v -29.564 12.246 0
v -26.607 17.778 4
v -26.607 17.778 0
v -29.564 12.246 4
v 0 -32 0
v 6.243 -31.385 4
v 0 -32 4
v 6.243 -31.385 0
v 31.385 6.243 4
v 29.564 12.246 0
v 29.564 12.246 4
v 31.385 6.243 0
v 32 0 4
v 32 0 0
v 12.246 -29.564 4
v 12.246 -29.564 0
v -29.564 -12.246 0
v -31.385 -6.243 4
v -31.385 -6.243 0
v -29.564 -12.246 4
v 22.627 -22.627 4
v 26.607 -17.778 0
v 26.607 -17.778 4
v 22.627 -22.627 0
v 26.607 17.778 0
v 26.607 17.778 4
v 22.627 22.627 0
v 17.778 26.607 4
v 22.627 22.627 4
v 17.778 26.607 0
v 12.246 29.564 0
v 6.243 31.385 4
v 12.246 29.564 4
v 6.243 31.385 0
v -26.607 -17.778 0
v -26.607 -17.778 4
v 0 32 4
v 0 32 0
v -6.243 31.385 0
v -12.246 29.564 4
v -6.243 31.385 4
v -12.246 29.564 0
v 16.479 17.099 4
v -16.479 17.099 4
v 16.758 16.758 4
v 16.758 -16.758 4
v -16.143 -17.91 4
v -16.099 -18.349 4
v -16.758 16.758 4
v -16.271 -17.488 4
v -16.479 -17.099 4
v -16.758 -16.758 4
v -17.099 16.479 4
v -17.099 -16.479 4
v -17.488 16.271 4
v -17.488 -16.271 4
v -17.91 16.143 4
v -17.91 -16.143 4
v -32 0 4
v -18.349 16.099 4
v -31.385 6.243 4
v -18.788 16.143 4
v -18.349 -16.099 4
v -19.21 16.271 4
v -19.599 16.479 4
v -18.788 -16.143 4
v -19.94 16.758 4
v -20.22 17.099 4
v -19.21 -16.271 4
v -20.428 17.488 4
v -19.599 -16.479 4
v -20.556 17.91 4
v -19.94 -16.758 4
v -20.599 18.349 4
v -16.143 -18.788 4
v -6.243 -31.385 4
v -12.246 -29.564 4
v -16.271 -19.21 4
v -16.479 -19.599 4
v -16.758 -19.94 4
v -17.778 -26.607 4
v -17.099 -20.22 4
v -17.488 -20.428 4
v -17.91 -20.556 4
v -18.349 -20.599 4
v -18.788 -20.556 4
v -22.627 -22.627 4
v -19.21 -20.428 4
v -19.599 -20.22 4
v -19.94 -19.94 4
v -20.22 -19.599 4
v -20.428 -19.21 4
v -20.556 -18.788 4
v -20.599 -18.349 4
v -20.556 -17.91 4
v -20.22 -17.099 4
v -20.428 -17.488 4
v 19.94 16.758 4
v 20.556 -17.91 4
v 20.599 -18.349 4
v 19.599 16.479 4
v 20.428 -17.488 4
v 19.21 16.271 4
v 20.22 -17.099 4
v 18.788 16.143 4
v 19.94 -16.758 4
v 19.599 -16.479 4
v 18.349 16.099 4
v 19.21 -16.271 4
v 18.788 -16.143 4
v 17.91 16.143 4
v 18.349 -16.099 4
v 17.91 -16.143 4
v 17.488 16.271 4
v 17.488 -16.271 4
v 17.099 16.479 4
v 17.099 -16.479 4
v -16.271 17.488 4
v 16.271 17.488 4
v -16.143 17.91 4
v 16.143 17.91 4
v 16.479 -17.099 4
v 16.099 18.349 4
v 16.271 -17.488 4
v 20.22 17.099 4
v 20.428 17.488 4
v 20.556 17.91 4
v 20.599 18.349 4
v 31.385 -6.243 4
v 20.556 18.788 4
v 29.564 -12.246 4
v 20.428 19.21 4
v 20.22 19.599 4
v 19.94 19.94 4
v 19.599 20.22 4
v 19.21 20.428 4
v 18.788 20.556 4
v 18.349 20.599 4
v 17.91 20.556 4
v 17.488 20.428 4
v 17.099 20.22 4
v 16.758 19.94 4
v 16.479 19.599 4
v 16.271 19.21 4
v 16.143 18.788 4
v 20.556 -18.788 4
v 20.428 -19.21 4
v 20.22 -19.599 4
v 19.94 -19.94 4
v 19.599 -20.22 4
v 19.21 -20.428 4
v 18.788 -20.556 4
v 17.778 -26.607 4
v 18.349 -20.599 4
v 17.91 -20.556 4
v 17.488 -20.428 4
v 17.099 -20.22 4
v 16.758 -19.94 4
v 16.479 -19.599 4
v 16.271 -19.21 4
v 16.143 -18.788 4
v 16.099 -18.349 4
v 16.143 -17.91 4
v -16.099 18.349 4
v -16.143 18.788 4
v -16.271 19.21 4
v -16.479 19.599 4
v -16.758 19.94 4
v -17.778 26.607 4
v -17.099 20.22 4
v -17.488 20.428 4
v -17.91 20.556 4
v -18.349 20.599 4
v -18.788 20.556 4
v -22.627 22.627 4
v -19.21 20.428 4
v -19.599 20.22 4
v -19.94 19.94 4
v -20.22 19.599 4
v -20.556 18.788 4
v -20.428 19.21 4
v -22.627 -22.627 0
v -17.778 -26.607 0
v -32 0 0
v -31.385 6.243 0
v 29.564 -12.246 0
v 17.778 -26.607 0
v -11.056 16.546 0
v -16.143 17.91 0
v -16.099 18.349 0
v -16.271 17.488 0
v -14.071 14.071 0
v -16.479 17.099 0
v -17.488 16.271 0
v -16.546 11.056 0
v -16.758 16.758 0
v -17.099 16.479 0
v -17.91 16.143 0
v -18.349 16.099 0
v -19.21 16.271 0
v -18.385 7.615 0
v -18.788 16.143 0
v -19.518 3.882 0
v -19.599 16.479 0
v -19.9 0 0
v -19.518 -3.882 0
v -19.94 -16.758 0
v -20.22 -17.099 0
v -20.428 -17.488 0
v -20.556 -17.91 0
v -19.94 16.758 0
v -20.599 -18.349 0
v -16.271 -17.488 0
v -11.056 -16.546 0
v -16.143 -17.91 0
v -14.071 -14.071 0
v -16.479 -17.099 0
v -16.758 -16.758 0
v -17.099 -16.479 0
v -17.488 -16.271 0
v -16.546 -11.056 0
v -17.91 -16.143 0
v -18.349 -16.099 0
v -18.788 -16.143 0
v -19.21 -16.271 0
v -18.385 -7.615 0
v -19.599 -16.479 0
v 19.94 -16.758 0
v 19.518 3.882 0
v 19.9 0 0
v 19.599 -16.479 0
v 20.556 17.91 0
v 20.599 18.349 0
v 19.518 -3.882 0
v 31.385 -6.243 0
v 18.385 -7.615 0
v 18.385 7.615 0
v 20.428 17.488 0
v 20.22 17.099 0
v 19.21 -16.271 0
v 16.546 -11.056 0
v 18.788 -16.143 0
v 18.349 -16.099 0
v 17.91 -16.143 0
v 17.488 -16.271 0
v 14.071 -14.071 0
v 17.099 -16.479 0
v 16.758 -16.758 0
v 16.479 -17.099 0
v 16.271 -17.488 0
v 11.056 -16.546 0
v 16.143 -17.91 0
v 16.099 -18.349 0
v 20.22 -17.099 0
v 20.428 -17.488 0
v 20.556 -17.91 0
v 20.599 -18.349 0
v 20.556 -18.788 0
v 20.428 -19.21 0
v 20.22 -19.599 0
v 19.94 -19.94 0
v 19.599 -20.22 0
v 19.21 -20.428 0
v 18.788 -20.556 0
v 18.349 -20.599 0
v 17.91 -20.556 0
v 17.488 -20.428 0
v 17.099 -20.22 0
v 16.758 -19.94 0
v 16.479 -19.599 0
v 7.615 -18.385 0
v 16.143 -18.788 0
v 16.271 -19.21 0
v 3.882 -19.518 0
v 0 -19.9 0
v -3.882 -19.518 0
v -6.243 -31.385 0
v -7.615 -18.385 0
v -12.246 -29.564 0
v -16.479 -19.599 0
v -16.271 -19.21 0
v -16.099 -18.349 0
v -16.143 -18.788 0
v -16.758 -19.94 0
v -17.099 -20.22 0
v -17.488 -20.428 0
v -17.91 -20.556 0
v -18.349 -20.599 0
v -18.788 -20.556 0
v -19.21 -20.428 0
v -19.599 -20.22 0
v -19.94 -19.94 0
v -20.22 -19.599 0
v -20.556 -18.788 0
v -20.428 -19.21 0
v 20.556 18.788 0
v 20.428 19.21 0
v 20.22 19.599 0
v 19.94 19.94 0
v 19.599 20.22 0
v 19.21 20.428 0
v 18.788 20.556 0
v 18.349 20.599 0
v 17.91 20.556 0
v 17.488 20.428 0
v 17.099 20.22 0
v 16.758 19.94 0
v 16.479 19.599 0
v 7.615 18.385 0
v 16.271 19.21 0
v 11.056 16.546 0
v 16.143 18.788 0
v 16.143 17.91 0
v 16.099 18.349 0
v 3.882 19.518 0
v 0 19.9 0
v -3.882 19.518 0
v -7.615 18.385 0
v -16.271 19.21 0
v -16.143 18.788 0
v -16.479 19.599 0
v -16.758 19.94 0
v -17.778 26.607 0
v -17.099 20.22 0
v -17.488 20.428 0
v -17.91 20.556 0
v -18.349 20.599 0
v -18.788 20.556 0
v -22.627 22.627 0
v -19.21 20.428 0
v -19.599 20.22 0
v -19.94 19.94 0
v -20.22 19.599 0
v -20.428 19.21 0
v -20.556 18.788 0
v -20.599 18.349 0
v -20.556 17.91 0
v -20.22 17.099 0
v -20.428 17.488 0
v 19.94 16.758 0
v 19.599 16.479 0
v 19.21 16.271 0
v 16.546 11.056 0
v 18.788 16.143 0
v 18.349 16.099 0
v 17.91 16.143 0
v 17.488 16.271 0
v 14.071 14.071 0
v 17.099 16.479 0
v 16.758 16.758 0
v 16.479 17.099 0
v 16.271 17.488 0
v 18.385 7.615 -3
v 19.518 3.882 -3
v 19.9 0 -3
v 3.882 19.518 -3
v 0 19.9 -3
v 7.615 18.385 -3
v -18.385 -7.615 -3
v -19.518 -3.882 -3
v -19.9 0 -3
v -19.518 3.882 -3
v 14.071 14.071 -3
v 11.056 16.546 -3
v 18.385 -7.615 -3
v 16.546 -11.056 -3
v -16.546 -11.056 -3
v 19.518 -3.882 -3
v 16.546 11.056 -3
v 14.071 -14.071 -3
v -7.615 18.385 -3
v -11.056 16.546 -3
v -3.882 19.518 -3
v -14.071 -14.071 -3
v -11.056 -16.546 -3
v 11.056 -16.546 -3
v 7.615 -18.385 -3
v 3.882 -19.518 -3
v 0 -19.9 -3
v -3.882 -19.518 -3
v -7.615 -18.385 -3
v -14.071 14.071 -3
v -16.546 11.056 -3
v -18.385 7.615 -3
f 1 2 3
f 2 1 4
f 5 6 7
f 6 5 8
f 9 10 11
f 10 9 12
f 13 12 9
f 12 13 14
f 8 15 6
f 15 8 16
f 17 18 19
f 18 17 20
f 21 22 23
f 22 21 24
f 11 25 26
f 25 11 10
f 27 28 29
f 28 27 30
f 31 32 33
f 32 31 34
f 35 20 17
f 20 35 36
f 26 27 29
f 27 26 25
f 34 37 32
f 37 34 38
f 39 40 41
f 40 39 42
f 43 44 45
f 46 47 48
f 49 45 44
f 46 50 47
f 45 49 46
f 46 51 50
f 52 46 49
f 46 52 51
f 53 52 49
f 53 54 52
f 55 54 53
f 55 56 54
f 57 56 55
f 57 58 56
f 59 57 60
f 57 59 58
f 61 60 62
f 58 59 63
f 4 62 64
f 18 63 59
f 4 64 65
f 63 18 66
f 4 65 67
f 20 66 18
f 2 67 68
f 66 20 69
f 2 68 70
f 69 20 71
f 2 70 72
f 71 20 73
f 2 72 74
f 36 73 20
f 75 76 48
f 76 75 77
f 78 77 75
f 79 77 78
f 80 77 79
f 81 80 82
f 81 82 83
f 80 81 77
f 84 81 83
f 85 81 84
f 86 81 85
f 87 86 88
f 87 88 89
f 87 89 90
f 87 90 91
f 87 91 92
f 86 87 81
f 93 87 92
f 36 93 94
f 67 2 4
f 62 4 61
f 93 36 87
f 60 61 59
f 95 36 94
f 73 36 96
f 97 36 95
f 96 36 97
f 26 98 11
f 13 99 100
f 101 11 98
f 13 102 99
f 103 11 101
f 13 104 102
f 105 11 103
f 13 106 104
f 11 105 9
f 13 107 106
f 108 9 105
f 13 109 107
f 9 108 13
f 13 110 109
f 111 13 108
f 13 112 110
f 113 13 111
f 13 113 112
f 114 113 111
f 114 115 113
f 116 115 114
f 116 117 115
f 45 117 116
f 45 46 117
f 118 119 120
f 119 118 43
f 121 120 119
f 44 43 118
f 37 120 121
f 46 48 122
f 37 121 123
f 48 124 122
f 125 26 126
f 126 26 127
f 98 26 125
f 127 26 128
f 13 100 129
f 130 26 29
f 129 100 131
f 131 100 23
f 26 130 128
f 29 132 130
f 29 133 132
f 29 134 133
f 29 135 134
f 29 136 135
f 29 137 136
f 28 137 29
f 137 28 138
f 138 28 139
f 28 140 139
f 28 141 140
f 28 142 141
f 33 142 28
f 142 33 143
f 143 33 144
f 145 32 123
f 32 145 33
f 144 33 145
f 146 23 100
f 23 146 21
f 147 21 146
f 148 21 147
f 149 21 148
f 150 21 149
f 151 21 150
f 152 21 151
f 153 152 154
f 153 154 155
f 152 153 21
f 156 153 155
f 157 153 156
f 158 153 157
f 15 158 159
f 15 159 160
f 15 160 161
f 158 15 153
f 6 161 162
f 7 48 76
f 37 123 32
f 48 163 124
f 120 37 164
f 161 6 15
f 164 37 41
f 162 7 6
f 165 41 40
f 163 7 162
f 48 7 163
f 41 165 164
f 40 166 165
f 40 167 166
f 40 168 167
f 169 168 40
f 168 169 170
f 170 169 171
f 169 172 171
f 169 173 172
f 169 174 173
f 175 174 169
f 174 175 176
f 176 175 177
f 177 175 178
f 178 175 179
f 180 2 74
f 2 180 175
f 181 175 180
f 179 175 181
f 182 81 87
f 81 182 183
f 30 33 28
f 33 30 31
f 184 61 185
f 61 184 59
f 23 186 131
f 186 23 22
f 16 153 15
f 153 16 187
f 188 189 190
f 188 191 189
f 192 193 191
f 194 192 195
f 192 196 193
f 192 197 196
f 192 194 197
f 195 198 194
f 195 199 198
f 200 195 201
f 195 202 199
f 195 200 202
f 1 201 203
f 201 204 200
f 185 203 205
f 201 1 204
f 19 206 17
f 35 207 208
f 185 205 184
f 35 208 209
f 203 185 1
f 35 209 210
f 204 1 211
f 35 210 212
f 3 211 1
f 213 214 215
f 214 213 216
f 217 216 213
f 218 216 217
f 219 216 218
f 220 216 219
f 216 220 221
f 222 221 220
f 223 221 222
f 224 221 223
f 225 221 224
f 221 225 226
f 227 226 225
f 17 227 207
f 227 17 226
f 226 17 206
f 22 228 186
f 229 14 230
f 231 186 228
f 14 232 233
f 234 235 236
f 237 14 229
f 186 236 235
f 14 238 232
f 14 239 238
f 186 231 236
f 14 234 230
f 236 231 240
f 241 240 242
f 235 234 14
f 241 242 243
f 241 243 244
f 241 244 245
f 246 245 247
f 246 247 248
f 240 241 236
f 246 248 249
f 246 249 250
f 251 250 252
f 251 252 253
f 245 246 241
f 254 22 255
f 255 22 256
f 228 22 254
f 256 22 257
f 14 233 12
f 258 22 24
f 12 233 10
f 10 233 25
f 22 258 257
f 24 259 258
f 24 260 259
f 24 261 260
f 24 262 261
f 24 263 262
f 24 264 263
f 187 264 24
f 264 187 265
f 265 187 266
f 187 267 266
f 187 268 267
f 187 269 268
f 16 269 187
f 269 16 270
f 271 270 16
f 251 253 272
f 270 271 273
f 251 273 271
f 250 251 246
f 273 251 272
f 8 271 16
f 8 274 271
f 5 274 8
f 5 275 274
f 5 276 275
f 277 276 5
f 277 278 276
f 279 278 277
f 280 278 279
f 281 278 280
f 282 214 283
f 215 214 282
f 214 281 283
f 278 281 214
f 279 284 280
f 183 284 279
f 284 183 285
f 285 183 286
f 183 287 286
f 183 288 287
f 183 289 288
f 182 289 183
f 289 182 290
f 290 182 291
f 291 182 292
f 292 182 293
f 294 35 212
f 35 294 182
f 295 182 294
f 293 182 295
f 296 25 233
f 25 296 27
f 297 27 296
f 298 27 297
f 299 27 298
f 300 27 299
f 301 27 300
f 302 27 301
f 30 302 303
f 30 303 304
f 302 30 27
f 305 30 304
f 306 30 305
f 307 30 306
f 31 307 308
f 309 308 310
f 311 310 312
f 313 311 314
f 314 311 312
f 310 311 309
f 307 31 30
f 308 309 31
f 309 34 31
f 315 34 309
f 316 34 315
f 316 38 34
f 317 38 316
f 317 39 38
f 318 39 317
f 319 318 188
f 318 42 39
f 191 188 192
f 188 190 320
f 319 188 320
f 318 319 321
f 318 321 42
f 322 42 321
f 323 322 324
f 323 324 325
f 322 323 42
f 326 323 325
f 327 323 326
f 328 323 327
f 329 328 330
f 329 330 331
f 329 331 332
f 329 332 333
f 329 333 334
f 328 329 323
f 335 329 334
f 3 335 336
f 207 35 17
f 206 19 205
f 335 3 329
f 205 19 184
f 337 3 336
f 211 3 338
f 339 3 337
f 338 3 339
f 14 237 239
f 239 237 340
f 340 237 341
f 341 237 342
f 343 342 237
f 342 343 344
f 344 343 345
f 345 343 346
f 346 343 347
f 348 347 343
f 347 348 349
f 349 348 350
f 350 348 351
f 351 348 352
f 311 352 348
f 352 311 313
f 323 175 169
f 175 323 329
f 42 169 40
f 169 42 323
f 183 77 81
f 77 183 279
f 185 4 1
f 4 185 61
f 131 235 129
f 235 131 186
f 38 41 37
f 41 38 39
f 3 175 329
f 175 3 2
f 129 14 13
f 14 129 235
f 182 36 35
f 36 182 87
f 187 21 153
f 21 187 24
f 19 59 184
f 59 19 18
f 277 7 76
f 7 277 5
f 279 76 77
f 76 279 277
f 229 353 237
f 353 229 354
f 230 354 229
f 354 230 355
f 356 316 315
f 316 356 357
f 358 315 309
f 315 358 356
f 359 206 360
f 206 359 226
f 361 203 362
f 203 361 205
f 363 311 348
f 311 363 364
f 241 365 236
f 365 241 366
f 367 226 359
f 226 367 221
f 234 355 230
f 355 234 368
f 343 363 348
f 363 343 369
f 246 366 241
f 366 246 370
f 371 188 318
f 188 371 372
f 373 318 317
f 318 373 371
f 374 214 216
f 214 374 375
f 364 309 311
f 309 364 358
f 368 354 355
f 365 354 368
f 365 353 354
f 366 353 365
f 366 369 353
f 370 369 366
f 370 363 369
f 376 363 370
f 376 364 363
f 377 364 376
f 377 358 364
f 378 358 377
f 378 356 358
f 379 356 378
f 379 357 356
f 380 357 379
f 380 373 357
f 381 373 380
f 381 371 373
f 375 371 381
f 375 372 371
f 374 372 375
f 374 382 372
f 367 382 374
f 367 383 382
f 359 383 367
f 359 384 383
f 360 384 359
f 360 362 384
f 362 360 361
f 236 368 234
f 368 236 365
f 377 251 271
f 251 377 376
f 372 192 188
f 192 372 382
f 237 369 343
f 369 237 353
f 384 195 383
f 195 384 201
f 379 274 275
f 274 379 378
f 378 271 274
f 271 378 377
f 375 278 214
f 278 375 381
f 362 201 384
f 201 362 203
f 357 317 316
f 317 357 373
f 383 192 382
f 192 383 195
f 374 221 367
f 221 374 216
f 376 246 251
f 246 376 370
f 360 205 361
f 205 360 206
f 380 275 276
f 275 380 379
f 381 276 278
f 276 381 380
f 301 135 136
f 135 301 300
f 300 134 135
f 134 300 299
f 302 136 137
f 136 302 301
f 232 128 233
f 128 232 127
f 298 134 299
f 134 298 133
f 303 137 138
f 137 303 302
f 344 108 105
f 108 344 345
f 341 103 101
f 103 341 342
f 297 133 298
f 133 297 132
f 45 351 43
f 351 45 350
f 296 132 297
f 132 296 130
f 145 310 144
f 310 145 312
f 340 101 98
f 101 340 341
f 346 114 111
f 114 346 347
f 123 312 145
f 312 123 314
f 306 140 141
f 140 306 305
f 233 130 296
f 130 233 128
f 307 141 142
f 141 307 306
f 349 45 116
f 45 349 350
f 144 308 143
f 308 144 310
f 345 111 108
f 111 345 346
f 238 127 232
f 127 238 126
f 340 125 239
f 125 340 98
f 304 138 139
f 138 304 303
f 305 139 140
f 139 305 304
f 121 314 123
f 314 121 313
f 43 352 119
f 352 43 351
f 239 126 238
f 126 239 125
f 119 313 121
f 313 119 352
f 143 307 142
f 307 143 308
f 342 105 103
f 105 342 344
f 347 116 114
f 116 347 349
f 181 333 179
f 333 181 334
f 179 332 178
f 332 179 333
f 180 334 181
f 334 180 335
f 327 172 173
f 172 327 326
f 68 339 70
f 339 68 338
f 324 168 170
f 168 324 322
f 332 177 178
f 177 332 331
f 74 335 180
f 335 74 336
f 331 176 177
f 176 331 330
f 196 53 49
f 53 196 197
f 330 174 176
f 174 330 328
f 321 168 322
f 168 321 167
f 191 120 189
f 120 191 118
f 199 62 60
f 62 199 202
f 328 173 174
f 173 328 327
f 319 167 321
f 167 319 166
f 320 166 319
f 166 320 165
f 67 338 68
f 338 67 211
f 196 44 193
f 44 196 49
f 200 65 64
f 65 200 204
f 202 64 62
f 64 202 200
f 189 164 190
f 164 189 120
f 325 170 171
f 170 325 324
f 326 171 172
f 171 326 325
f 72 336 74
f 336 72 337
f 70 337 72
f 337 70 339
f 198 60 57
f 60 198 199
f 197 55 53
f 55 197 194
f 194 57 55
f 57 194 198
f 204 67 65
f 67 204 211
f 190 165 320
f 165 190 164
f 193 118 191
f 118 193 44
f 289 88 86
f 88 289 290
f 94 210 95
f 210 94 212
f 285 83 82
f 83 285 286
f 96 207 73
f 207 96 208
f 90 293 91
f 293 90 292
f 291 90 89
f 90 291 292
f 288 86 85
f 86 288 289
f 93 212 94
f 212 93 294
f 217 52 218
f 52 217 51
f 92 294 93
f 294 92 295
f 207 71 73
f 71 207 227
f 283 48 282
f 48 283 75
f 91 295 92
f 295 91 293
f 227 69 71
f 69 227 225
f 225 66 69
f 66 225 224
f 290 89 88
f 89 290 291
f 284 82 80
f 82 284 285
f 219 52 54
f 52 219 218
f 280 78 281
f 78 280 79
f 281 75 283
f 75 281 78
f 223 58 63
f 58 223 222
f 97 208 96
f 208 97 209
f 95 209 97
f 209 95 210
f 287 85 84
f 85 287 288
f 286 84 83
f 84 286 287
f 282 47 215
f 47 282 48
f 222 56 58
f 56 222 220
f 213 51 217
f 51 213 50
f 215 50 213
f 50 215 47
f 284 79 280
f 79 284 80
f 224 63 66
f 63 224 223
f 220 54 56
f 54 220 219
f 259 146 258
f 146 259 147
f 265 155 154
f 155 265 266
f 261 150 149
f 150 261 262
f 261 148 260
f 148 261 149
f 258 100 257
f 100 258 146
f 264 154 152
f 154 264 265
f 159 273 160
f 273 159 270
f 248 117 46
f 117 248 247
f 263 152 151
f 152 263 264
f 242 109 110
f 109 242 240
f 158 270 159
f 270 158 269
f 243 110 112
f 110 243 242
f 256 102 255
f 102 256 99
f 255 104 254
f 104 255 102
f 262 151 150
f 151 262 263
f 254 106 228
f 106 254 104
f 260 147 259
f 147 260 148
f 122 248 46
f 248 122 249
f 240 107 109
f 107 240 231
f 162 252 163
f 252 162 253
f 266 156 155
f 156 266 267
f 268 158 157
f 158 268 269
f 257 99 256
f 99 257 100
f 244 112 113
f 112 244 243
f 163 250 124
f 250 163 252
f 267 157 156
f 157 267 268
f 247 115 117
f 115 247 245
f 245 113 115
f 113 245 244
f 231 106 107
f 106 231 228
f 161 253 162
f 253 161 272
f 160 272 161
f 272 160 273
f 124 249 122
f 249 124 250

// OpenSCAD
$fn = 32;

// ----------------------------------------------------------------------
// Retaining cap: 6203 cover, 64 mm, spigot 39.8 mm
// ----------------------------------------------------------------------

// --- parameters (mm) ---
cover_d = 64;             // cover diameter
cover_t = 4;              // cover thickness
spigot_d = 39.8;          // spigot that enters the housing
spigot_h = 3;             // spigot height
bolt_d = 4.5;             // bolt clearance
bolt_r = 25.95;           // bolt circle radius

module cover() {
  cylinder(h = cover_t, d = cover_d);
}

module spigot() {
  /* sunk 1 mm into the cover; the spigot sets the overall height */
  translate([0, 0, -spigot_h]) cylinder(h = spigot_h + 1, d = spigot_d);
}

difference() {
  union() {
    cover();
    spigot();
  }
  for (i = [0 : 3]) rotate([0, 0, 45 + i * 90]) translate([bolt_r, 0, -spigot_h - 1])
    cylinder(h = spigot_h + cover_t + 2, d = bolt_d);
}
